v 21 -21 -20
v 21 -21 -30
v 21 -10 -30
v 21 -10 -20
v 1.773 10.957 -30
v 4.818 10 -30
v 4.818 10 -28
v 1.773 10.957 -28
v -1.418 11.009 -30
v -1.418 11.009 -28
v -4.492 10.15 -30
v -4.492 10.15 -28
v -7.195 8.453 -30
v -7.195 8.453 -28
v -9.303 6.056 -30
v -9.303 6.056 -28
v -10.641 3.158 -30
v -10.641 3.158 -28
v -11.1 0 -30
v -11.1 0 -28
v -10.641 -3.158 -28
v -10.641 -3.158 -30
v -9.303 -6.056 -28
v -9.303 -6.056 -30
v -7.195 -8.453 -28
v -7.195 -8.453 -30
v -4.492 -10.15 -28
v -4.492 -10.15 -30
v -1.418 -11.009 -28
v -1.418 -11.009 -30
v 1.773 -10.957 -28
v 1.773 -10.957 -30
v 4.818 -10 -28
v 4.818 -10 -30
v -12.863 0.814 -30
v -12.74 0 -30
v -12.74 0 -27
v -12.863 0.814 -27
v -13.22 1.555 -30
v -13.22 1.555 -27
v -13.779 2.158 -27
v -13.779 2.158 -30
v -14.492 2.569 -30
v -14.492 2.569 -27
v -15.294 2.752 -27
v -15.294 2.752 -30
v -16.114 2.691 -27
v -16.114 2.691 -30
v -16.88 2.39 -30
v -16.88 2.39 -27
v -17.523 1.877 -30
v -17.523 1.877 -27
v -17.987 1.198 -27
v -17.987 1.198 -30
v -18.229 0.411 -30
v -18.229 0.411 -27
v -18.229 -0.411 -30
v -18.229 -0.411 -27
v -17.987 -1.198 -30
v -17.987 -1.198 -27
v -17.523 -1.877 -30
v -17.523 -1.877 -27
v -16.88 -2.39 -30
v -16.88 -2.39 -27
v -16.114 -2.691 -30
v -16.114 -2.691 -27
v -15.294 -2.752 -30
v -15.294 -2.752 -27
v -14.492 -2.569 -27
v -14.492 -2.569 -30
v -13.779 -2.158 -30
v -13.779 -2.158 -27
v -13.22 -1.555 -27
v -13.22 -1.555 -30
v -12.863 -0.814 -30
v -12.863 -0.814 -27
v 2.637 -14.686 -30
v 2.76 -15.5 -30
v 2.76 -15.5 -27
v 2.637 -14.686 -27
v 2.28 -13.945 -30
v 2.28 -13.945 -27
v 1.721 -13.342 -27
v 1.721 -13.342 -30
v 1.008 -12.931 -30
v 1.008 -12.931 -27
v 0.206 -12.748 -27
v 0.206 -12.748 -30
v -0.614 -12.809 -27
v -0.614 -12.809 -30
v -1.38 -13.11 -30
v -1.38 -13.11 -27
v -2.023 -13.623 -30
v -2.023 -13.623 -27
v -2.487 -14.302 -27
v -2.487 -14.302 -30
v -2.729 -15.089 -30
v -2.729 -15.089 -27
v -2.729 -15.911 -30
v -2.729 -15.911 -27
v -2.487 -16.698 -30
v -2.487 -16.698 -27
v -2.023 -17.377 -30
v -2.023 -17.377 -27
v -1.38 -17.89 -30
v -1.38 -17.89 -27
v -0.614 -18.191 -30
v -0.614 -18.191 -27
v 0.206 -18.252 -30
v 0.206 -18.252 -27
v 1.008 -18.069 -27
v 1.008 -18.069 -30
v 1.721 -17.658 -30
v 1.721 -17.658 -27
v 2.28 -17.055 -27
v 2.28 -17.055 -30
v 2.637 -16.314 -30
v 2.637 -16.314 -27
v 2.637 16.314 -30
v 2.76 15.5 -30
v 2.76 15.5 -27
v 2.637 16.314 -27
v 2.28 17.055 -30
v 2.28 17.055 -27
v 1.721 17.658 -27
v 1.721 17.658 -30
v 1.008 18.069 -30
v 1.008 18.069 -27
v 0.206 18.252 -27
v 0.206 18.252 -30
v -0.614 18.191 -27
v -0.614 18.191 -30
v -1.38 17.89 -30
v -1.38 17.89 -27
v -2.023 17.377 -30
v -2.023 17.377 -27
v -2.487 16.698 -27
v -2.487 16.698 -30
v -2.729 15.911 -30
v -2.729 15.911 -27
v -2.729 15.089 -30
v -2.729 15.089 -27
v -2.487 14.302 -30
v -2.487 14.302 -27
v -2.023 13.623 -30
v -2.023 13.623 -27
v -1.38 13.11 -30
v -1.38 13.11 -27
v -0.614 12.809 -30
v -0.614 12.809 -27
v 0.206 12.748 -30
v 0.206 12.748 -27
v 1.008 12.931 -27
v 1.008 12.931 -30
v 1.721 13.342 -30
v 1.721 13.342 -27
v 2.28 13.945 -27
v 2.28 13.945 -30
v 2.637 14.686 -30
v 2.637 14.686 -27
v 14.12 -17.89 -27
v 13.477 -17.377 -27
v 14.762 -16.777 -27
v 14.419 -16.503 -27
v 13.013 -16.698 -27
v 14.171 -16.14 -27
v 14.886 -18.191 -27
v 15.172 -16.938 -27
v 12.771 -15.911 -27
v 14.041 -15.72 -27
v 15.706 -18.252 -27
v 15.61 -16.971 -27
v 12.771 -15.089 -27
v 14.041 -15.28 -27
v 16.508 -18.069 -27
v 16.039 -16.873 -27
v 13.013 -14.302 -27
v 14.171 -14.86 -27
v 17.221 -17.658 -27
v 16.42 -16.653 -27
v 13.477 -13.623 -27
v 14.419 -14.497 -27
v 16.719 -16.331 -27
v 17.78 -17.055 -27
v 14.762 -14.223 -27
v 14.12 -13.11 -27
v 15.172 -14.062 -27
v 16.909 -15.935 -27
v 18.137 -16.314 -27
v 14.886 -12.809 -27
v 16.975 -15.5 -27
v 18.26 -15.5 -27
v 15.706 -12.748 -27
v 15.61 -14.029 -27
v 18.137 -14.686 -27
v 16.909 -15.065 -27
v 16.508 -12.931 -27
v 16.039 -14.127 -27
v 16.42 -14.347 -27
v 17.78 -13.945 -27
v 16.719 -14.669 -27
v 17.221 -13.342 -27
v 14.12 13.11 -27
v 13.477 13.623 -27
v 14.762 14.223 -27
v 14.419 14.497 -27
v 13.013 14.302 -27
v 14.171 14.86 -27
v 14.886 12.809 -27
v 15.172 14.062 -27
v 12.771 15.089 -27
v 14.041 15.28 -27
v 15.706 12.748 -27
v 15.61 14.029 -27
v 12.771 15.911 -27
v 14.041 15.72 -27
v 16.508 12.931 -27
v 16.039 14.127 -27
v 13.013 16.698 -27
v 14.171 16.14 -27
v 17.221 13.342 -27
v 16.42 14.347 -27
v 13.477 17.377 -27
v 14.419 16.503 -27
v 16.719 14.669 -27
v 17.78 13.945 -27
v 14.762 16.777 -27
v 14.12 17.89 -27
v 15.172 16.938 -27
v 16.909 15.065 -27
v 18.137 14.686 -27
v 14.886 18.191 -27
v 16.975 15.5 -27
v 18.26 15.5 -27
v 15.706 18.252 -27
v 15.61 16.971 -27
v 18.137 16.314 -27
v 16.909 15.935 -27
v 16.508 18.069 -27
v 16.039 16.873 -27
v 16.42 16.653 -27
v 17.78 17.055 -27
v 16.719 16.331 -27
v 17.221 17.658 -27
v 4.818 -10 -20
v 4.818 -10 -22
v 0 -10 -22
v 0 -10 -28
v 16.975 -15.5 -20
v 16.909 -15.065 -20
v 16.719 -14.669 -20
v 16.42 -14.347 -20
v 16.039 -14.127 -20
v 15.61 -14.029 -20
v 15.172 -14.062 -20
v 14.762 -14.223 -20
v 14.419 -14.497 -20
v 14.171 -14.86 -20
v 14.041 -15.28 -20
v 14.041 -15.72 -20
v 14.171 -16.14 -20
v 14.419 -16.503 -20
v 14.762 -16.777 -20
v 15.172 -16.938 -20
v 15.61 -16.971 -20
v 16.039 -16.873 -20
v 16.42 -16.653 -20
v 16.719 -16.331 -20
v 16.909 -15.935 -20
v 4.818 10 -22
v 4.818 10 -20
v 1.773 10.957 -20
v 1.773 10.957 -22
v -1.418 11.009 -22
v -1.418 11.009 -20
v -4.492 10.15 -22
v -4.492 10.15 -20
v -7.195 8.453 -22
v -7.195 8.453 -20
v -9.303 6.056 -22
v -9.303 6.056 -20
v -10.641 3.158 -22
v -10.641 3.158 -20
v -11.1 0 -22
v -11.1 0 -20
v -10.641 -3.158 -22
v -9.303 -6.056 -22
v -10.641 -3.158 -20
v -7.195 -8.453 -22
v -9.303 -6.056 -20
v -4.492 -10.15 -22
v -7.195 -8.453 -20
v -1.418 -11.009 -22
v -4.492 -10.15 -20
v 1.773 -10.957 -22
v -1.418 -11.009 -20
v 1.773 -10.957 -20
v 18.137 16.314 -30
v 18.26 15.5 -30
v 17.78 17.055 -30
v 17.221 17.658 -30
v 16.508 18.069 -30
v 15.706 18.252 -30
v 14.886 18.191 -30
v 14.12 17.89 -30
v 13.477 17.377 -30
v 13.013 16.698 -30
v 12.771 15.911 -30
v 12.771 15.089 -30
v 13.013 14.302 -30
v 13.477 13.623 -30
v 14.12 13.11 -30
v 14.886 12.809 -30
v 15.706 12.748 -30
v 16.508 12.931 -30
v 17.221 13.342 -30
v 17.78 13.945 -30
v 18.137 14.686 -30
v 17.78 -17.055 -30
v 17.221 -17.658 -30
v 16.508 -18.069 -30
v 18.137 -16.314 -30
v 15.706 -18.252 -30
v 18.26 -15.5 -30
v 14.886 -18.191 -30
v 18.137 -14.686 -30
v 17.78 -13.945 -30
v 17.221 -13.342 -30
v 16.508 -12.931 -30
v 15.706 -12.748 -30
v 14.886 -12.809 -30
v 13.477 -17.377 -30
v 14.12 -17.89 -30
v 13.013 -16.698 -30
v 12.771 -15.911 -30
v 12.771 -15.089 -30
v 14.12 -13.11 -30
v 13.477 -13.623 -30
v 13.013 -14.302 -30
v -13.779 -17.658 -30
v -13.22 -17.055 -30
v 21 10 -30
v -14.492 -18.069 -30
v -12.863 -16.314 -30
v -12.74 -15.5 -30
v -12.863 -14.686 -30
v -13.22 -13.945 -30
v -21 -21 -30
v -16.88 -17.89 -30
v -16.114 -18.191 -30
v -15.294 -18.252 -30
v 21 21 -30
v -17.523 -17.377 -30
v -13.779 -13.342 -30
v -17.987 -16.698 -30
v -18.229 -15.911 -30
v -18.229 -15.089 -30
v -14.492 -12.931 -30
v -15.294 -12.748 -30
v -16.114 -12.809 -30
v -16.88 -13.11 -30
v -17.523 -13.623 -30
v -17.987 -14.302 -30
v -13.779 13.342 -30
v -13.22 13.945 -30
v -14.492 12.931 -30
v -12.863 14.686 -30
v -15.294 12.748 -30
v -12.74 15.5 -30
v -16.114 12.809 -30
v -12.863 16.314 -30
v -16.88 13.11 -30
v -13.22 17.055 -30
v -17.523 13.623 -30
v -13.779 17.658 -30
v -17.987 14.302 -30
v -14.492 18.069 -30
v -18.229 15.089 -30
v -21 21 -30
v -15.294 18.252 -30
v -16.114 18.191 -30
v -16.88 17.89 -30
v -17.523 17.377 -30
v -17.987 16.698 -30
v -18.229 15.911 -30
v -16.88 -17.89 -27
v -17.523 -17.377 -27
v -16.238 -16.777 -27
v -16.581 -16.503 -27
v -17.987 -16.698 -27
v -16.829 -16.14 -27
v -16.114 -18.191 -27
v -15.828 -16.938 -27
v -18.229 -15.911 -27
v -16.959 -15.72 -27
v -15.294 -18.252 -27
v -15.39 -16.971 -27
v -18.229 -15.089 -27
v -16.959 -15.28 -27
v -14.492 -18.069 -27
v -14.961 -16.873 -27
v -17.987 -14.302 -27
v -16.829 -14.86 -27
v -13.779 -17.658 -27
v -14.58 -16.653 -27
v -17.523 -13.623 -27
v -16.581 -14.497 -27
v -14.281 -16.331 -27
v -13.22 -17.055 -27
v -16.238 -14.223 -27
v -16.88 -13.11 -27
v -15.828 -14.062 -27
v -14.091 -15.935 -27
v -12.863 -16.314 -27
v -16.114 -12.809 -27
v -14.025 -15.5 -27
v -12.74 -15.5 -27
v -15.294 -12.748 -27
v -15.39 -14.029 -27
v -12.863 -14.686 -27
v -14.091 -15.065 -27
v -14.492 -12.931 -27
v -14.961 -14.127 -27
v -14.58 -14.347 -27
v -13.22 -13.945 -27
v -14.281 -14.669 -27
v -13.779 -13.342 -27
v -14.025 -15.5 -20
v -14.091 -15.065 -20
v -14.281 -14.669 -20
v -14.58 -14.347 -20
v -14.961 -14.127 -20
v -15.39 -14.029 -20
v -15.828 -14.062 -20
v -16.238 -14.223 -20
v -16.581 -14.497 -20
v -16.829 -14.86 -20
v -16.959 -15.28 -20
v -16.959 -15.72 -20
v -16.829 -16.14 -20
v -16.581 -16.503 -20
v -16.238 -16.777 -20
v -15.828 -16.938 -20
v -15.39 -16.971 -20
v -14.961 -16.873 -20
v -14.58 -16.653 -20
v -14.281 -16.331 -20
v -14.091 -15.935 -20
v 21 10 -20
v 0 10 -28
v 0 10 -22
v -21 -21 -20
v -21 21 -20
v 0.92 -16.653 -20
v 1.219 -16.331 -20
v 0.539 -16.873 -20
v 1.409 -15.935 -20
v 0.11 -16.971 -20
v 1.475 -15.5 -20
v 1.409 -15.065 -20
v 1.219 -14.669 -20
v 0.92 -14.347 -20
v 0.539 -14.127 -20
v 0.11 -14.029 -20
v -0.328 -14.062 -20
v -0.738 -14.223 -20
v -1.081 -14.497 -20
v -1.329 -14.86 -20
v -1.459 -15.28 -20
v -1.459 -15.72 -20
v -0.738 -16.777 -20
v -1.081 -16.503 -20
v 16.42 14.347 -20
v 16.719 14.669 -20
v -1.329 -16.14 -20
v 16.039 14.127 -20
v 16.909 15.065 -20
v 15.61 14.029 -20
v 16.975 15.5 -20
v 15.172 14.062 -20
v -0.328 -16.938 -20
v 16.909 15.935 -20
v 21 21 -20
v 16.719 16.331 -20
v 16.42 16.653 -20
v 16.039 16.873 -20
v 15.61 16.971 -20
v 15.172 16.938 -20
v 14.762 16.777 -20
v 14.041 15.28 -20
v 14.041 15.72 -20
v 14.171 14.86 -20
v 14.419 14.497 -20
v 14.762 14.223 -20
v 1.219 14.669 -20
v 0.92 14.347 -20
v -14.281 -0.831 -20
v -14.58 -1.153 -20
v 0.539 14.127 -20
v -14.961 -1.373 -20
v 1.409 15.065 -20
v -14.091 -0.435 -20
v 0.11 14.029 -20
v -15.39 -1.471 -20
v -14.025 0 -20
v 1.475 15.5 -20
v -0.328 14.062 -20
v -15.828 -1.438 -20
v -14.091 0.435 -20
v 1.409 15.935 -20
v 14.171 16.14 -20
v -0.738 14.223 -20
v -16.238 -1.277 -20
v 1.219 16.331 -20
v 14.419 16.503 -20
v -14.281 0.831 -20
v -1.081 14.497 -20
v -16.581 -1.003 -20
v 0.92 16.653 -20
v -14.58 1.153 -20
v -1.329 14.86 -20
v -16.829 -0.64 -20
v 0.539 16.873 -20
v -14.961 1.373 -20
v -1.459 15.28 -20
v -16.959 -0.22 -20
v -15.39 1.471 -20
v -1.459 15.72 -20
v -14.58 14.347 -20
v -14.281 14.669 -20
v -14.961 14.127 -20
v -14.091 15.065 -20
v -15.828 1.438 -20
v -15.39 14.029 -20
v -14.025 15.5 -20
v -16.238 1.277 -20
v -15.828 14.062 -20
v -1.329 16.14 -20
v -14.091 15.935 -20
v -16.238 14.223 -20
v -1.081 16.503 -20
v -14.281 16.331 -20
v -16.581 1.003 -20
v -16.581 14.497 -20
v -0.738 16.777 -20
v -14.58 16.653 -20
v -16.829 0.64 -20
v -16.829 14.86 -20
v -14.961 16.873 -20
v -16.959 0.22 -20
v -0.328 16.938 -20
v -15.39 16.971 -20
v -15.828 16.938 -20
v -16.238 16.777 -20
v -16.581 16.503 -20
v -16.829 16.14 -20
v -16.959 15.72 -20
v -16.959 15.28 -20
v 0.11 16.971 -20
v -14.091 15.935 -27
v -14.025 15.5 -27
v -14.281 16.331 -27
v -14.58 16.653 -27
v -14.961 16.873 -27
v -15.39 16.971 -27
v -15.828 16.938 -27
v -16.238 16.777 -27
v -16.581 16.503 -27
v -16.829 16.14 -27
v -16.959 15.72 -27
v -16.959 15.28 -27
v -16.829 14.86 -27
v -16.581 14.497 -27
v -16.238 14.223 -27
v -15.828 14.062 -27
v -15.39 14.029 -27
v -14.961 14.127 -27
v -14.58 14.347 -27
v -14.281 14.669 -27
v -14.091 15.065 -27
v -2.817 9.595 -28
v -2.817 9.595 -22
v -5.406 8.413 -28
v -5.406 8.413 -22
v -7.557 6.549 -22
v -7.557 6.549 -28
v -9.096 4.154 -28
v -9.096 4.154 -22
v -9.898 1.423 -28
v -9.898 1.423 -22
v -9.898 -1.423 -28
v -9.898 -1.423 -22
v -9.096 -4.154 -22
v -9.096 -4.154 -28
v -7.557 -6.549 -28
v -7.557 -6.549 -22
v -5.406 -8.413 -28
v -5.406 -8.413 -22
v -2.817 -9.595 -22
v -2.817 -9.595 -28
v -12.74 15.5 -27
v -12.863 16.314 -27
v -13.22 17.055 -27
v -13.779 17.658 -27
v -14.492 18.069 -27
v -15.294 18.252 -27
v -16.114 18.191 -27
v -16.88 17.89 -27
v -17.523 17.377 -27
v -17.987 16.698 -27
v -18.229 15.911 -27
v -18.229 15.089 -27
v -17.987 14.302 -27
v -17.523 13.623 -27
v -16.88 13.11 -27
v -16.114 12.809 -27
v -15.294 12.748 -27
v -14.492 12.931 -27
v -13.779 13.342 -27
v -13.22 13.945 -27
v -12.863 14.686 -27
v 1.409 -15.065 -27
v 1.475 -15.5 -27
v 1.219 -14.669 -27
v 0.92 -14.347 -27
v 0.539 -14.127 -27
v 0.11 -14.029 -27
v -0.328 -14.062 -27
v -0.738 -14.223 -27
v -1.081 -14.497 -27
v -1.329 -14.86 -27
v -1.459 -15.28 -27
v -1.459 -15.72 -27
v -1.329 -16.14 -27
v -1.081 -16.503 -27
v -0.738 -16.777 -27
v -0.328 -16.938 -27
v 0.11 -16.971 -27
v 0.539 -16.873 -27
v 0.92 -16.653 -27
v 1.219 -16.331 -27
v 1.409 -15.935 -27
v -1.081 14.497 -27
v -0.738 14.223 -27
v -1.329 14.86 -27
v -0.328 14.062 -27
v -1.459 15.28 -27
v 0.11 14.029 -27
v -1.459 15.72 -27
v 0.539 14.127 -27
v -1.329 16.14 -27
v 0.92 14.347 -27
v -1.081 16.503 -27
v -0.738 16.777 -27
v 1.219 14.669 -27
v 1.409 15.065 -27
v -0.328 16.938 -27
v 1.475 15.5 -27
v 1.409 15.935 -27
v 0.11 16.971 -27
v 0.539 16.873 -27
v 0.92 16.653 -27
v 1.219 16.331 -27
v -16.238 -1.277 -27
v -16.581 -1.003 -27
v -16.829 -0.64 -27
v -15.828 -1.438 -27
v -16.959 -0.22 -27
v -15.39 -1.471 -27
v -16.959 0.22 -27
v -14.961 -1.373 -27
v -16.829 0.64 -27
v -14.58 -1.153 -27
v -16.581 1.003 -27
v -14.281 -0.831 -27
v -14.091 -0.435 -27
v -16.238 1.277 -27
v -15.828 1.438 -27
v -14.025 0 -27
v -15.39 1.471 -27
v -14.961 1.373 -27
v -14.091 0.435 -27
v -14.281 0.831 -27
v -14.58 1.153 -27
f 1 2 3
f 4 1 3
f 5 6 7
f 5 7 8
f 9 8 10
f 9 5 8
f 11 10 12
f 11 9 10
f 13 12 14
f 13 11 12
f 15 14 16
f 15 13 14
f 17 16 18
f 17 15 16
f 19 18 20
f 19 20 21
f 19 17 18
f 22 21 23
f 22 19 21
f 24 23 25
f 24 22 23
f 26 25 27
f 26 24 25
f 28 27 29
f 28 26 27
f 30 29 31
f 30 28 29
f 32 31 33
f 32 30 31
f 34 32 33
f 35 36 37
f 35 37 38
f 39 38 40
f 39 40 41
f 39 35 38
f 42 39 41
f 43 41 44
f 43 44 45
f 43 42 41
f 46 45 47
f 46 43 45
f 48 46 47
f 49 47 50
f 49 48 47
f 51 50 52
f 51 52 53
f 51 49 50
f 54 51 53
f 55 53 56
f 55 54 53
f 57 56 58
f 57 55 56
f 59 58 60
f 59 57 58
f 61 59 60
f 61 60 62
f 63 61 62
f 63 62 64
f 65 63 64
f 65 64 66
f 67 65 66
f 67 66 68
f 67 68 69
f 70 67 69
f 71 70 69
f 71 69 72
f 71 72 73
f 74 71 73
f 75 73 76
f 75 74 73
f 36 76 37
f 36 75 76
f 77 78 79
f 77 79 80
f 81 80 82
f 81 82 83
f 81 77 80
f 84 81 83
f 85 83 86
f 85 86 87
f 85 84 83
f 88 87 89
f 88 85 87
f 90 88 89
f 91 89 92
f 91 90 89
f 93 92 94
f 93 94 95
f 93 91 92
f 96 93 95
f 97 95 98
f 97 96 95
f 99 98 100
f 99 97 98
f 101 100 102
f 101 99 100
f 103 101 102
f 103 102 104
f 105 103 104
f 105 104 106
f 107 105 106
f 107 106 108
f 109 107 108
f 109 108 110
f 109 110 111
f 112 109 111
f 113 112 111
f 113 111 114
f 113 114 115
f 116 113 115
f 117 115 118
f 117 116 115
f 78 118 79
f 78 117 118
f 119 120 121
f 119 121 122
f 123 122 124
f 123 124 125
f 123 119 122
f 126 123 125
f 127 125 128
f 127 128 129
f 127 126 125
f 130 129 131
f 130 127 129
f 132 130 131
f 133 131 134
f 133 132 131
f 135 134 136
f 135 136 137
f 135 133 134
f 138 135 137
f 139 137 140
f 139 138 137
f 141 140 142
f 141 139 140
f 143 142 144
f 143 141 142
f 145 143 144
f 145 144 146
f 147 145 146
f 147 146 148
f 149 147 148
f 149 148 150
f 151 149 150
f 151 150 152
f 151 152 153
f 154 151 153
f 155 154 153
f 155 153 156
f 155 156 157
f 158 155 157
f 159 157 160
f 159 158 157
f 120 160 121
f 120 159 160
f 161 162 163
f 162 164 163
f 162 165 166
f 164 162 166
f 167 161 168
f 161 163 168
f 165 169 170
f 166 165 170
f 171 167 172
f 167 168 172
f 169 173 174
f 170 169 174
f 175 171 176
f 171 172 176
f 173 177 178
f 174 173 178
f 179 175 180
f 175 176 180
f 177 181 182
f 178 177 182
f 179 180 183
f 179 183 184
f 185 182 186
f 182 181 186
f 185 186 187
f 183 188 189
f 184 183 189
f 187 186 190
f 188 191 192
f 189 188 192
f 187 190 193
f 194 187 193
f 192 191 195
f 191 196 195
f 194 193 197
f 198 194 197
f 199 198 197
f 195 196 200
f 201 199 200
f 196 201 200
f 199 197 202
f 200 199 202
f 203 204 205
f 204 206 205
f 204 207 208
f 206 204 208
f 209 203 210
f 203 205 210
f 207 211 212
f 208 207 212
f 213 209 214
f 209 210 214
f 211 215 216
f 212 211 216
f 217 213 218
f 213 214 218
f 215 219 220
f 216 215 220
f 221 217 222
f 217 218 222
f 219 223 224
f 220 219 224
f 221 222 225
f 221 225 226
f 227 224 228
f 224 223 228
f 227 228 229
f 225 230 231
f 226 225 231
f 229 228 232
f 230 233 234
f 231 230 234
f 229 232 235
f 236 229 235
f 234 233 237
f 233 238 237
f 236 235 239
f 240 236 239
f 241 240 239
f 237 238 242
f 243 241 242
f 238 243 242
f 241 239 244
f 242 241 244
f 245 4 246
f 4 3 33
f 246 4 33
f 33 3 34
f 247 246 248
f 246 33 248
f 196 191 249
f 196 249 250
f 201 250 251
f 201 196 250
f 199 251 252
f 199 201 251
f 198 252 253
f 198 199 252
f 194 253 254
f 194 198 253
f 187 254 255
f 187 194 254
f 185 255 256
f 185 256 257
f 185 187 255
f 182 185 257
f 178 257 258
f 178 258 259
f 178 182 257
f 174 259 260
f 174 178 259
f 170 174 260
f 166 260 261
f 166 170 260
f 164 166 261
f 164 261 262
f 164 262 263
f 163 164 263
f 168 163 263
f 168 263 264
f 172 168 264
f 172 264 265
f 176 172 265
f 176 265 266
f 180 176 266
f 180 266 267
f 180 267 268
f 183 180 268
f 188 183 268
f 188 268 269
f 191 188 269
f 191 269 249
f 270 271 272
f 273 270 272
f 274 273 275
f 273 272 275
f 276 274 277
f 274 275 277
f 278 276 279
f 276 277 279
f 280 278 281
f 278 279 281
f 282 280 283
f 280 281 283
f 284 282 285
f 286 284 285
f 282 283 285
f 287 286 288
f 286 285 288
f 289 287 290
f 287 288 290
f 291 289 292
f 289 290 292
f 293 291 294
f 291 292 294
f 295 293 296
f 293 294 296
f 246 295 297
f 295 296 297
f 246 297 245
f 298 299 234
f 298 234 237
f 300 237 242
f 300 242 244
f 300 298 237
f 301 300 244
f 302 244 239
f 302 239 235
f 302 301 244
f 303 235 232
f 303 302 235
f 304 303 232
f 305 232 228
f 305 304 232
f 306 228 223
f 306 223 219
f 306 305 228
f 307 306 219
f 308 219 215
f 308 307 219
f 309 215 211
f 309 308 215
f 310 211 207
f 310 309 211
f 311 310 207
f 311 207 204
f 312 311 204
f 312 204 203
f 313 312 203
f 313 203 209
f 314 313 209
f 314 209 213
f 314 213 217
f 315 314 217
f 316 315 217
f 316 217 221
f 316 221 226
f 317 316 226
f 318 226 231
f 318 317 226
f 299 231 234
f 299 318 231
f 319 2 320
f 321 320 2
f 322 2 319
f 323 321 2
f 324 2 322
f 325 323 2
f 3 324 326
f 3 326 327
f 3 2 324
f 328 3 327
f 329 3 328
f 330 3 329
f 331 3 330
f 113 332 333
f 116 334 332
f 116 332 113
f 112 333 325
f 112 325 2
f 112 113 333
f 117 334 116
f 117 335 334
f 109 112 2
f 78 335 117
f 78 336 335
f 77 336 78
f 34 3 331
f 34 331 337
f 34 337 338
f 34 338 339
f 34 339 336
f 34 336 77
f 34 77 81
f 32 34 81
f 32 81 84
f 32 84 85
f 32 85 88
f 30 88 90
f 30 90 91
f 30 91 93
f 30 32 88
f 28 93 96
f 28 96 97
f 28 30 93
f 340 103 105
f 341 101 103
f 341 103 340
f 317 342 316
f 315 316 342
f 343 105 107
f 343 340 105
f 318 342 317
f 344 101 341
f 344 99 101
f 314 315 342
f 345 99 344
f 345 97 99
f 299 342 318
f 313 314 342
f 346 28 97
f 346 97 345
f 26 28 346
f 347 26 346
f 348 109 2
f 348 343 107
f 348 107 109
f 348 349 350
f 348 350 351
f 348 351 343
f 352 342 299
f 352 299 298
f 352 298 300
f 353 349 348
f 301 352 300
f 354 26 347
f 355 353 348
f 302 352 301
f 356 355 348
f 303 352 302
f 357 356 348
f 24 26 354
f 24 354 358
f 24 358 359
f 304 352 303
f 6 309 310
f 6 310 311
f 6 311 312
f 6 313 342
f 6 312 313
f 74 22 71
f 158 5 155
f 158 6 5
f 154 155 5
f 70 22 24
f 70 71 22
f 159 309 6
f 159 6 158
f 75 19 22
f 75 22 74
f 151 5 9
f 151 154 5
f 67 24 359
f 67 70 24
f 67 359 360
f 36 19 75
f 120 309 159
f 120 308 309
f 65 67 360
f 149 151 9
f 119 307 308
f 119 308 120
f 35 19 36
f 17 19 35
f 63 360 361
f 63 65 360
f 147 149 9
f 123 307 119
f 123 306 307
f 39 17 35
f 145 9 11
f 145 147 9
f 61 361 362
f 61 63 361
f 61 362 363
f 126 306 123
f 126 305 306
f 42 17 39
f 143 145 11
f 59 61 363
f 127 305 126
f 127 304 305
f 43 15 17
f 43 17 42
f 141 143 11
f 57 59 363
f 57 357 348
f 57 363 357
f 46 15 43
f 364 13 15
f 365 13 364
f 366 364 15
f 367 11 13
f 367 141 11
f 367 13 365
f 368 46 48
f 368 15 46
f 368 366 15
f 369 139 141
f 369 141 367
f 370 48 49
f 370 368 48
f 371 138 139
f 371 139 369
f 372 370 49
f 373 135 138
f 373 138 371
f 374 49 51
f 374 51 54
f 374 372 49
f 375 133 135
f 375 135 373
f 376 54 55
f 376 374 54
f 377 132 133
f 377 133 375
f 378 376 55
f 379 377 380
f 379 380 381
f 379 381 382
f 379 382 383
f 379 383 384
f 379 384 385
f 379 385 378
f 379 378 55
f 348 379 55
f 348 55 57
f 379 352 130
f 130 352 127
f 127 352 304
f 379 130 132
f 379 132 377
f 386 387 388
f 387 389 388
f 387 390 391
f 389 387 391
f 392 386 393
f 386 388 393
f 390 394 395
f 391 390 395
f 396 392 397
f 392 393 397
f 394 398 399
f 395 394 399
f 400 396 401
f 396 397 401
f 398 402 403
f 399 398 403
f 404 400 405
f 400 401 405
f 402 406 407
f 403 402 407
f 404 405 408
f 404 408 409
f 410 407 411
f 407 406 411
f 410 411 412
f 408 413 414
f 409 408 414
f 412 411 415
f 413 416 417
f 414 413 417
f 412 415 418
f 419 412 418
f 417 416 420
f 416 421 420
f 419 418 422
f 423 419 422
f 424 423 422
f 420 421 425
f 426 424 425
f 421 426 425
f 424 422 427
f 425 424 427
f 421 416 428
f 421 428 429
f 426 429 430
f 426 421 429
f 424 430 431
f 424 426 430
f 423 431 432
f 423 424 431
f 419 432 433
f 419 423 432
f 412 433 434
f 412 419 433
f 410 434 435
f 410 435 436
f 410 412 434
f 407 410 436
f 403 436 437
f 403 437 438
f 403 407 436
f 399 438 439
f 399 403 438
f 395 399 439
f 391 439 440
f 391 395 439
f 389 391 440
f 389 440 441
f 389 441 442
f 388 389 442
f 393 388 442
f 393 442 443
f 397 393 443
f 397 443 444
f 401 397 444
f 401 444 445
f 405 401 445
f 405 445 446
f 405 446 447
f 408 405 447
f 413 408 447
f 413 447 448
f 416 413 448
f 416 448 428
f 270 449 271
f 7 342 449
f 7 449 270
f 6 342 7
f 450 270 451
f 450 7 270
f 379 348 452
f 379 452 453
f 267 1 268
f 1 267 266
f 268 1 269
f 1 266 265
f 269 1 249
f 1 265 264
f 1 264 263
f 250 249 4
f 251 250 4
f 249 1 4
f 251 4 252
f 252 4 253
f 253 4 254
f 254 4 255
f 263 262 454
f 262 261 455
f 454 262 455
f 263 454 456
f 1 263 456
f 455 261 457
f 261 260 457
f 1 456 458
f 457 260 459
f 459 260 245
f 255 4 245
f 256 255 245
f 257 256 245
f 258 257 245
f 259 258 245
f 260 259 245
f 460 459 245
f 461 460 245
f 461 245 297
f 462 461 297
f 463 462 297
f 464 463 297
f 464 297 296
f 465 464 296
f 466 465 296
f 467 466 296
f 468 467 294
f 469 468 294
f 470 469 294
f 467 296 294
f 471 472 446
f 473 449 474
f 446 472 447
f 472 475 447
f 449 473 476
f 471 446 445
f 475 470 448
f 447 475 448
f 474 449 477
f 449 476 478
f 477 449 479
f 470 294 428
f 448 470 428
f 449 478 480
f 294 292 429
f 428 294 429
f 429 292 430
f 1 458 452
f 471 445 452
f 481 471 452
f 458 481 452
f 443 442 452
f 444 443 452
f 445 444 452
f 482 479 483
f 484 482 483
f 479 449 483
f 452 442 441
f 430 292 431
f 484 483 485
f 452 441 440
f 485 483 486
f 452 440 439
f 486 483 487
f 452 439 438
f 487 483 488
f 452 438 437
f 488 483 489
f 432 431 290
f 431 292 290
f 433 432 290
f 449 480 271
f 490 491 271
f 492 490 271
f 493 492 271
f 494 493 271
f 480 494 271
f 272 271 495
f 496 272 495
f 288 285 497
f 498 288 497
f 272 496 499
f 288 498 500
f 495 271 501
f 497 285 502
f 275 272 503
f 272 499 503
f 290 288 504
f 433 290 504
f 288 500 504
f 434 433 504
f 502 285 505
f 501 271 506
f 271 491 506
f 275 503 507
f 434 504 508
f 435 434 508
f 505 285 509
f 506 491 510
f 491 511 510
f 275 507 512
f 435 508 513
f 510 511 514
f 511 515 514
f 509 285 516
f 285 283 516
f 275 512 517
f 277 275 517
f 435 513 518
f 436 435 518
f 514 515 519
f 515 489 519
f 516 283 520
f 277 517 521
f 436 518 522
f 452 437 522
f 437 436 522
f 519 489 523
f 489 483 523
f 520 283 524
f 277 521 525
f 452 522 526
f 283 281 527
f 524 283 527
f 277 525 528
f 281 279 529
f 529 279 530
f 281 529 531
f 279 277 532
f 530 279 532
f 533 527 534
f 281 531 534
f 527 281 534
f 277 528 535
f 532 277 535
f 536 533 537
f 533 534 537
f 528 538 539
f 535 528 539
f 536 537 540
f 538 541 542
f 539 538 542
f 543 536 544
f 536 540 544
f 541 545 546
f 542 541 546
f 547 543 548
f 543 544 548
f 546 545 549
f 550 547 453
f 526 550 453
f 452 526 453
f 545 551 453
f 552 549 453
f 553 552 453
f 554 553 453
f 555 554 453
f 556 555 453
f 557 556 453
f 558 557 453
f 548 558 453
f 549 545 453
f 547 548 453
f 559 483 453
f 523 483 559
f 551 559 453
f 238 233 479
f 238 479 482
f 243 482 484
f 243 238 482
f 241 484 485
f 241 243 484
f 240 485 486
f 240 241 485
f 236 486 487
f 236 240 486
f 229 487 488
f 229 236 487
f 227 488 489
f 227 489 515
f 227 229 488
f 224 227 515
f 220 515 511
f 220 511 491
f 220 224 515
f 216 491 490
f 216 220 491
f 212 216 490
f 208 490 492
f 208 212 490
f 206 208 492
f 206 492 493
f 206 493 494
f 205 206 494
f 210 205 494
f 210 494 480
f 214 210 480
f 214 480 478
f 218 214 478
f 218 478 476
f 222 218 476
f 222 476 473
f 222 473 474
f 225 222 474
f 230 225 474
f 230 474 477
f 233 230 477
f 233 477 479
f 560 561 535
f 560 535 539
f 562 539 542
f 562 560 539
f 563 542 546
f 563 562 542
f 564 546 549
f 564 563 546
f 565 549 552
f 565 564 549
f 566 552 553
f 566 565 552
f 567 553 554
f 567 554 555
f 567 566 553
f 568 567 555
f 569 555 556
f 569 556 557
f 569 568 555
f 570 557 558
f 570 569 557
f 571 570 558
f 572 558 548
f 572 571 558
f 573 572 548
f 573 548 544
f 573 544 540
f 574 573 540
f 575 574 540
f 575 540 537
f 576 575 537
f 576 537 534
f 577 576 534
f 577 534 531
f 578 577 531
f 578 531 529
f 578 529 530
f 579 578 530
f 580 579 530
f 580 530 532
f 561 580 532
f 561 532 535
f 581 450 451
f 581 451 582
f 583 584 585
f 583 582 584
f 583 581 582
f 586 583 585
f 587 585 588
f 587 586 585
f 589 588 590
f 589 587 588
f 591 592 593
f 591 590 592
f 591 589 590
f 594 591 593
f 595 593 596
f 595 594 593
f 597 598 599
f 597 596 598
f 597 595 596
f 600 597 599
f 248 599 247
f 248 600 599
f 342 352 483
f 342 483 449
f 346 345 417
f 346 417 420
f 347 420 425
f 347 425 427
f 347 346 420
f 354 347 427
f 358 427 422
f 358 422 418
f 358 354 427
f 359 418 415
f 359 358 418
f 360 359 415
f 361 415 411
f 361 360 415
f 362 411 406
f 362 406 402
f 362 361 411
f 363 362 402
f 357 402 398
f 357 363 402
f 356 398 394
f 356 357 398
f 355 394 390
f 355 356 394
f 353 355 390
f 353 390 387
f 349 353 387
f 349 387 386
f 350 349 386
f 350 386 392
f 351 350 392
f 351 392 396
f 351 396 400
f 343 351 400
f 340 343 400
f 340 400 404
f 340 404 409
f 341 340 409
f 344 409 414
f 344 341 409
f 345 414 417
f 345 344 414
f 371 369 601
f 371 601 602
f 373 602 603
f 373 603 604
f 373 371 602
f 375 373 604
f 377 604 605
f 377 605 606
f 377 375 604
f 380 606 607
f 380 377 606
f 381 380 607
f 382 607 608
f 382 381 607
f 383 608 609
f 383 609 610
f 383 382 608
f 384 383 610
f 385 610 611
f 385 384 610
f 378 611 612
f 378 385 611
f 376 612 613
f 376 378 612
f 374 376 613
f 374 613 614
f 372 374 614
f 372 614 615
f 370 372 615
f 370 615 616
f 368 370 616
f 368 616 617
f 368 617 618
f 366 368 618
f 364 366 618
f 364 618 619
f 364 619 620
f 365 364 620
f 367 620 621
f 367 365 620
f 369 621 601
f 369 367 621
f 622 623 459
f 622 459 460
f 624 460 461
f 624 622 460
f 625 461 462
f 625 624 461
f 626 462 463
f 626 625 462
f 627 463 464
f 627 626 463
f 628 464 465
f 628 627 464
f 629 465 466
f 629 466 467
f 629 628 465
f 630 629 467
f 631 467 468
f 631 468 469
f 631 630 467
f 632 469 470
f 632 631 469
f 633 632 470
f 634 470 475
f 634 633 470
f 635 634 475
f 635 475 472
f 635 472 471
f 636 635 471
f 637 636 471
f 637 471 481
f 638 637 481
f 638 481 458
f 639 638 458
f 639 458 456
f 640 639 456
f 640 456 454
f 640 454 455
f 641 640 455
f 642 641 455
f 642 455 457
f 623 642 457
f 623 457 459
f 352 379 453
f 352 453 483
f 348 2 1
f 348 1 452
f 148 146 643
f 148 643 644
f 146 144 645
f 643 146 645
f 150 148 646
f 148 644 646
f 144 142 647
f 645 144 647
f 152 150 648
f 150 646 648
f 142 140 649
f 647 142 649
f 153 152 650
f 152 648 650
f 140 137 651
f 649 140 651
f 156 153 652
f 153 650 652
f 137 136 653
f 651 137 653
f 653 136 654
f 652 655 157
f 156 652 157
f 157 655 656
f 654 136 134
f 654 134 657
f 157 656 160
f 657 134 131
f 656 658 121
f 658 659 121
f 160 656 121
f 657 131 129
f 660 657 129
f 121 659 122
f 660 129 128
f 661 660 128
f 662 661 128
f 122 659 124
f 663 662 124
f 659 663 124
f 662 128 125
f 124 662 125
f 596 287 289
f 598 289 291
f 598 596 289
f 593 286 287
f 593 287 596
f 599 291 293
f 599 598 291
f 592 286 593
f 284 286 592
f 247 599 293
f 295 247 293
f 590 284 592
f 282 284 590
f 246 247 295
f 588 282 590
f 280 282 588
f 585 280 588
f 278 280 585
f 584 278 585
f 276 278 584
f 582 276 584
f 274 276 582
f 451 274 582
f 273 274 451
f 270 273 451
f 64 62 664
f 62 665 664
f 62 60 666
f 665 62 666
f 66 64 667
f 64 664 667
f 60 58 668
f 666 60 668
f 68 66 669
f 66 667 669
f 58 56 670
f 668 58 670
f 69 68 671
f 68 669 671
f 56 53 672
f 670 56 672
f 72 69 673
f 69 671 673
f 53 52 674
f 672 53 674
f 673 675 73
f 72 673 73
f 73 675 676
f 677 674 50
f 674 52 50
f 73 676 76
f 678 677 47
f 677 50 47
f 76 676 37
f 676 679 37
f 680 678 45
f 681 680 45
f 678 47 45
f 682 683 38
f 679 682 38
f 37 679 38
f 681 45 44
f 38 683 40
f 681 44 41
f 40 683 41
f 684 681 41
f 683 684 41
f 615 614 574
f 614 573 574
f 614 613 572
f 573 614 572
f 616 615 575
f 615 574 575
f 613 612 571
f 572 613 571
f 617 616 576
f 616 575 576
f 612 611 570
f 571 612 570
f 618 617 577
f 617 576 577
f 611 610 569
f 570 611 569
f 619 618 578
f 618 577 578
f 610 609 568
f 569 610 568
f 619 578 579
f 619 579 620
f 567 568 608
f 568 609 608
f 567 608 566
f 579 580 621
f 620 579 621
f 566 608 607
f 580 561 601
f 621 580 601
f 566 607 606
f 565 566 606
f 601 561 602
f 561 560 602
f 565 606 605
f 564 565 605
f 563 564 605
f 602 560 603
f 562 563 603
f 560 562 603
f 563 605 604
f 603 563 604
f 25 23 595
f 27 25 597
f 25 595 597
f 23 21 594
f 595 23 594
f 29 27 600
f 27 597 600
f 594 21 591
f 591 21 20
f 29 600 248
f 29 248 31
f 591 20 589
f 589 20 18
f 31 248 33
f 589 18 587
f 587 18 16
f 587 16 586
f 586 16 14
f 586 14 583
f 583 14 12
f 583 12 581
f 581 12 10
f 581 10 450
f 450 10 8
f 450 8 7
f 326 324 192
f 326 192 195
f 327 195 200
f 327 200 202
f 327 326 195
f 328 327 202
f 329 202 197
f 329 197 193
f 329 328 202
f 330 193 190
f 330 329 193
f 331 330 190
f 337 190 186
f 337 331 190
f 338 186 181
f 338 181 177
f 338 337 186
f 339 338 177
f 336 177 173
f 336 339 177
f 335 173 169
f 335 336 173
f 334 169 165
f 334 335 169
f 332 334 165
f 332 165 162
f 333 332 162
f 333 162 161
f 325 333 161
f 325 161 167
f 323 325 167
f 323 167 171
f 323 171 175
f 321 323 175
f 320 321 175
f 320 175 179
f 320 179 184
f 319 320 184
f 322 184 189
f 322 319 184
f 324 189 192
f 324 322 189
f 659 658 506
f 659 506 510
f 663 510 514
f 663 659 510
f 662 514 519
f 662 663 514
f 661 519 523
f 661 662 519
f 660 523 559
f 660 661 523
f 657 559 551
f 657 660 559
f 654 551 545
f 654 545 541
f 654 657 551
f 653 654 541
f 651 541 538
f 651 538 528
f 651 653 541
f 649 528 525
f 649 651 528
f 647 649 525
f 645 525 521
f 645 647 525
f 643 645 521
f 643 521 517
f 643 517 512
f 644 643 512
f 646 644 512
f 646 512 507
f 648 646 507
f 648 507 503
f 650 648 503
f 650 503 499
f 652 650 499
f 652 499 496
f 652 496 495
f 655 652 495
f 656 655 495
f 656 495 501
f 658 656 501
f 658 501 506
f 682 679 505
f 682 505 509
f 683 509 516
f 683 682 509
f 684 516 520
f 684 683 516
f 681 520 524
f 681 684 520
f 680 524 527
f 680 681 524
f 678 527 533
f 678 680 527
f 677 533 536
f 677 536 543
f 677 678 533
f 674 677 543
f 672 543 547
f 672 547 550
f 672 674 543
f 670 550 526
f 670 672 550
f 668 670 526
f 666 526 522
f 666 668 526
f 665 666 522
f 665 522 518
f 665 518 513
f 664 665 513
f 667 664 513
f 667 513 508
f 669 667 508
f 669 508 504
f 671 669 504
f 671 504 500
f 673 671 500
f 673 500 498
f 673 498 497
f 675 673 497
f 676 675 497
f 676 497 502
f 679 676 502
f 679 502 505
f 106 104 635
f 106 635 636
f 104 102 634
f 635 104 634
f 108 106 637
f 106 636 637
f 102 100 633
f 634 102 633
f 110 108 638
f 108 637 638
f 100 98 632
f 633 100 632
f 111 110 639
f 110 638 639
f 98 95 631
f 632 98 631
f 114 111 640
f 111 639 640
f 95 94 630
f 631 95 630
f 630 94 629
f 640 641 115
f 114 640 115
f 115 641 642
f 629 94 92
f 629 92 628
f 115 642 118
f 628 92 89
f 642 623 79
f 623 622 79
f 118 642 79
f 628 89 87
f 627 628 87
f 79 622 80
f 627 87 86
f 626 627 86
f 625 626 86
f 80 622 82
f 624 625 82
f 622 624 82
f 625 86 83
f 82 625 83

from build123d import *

# Parameters (mm, degrees)
SKETCH004_R     = 1.475
PAD003_DEPTH    = 10
SKETCH009_R     = 2.76
POCKET002_DEPTH = 3
SKETCH014_R     = 11.1
POCKET006_DEPTH = 2
SKETCH042_R     = 11.1
POCKET026_DEPTH = 2


with BuildPart() as part:
    # Sketch004 → Pad003 (new body)
    with BuildSketch(Plane.XY):
        with BuildLine():
            Line((-21, 21), (21, 21))
            Line((21, 21), (21, 10))
            Line((21, 10), (0, 10))
            ThreePointArc((0, 10), (-10, 0), (0, -10))
            Line((21, -10), (0, -10))
            Line((21, -21), (21, -10))
            Line((21, -21), (-21, -21))
            Line((-21, -21), (-21, 21))
        make_face()
        with Locations((-15.5, 15.5)):
            Circle(SKETCH004_R, mode=Mode.SUBTRACT)
        with Locations((15.5, 15.5)):
            Circle(SKETCH004_R, mode=Mode.SUBTRACT)
        with Locations((-15.5, -15.5)):
            Circle(SKETCH004_R, mode=Mode.SUBTRACT)
        with Locations((15.5, -15.5)):
            Circle(SKETCH004_R, mode=Mode.SUBTRACT)
        with Locations((-15.5, 0)):
            Circle(SKETCH004_R, mode=Mode.SUBTRACT)
        with Locations((0, 15.5)):
            Circle(SKETCH004_R, mode=Mode.SUBTRACT)
        with Locations((0, -15.5)):
            Circle(SKETCH004_R, mode=Mode.SUBTRACT)
    extrude(amount=PAD003_DEPTH)

    # Sketch009 → Pocket002 (cut)
    with BuildSketch(Plane.XY):
        with Locations((-15.5, 15.5)):
            Circle(SKETCH009_R)
        with Locations((15.5, 15.5)):
            Circle(SKETCH009_R)
        with Locations((-15.5, -15.5)):
            Circle(SKETCH009_R)
        with Locations((15.5, -15.5)):
            Circle(SKETCH009_R)
        with Locations((-15.5, 0)):
            Circle(SKETCH009_R)
        with Locations((0, 15.5)):
            Circle(SKETCH009_R)
        with Locations((0, -15.5)):
            Circle(SKETCH009_R)
    extrude(amount=POCKET002_DEPTH, mode=Mode.SUBTRACT)

    # Sketch014 (on Face5 of Pocket002) → Pocket006 (cut)
    with BuildSketch(Plane.XY.offset(10)):
        Circle(SKETCH014_R)
    extrude(amount=-POCKET006_DEPTH, mode=Mode.SUBTRACT)

    # Sketch042 → Pocket026 (cut)
    with BuildSketch(Plane.XY):
        Circle(SKETCH042_R)
    extrude(amount=POCKET026_DEPTH, mode=Mode.SUBTRACT)


with BuildPart() as part_1:
    # Body003 placement: moved
    add(part.part.moved(Location((0, 0, -30))))


solid = part_1.part
